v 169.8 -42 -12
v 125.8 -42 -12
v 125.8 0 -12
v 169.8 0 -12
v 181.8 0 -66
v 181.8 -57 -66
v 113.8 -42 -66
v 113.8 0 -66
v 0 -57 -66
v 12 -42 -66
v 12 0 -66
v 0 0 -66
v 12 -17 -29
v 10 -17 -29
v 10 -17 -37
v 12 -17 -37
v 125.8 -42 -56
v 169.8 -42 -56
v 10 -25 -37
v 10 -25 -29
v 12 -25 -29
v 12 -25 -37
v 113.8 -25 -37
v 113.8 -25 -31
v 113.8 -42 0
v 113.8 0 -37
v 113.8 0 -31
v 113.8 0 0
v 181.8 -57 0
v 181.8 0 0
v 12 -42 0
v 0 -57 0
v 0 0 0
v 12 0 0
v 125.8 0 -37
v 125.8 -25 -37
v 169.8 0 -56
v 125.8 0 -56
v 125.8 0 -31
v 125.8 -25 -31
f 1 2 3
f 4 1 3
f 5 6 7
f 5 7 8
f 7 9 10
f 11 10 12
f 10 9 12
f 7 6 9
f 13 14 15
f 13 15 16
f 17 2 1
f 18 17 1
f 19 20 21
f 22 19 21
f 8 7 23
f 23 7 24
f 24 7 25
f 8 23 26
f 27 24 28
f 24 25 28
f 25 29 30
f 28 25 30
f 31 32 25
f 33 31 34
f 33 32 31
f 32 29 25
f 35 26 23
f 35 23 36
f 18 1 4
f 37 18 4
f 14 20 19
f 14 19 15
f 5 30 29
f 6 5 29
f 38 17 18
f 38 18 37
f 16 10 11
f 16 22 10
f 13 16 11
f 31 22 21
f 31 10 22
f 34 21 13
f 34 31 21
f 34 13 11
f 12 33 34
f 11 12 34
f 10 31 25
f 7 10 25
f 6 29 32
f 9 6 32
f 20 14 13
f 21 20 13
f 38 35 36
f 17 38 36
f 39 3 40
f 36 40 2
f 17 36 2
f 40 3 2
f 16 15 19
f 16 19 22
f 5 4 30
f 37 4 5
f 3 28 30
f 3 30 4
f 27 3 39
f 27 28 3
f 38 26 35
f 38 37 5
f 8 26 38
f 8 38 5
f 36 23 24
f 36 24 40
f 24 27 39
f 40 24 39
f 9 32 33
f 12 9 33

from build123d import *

# Parameters (mm, degrees)
BOSS_EXTRUDE1_DEPTH = 66
SKETCH3_W           = 2
SKETCH3_H           = 8
CUT_EXTRUDE1_DEPTH  = 37
SKETCH3_3_W         = 2
SKETCH3_3_H         = 8
BOSS_EXTRUDE2_DEPTH = 29
BOSS_EXTRUDE3_REACH = 155.071
SKETCH4_W           = 12
SKETCH4_H           = 42
SKETCH4_W_2         = 10
SKETCH5_W           = 12
SKETCH5_H           = 6
CUT_EXTRUDE2_DEPTH  = 25


with BuildPart() as part:
    # Sketch2 → Boss-Extrude1 (new body)
    with BuildSketch(Plane.XY):
        Polygon((0, 0), (12, 0), (12, -42), (113.8, -42), (113.8, 0), (125.8, 0), (125.8, -42), (169.8, -42), (169.8, 0), (181.8, 0), (181.8, -57), (0, -57), align=None)
    extrude(amount=-BOSS_EXTRUDE1_DEPTH)

    # Sketch3 → Cut-Extrude1 (cut)
    with BuildSketch(Plane.XY):
        with Locations((11, -21)):
            Rectangle(SKETCH3_W, SKETCH3_H)
    extrude(amount=-CUT_EXTRUDE1_DEPTH, mode=Mode.SUBTRACT)

    # Sketch3<3> → Boss-Extrude2 (add)
    with BuildSketch(Plane.XY):
        with Locations((11, -21)):
            Rectangle(SKETCH3_3_W, SKETCH3_3_H)
    extrude(amount=-BOSS_EXTRUDE2_DEPTH)

    # Sketch4 → Boss-Extrude3 (add, up to next)
    with BuildSketch(Plane(origin=(125.8, 0, 0), x_dir=(0, 0, -1), z_dir=(1, 0, 0)), mode=Mode.PRIVATE) as boss_extrude3_sk1:
        with Locations((6, -21)):
            Rectangle(SKETCH4_W, SKETCH4_H)
    boss_extrude3_tool1 = extrude(boss_extrude3_sk1.sketch, amount=BOSS_EXTRUDE3_REACH, mode=Mode.PRIVATE) - part.part
    # Sketch4 → Boss-Extrude3 (add, up to next)
    with BuildSketch(Plane(origin=(125.8, 0, 0), x_dir=(0, 0, -1), z_dir=(1, 0, 0)), mode=Mode.PRIVATE) as boss_extrude3_sk2:
        with Locations((61, -21)):
            Rectangle(SKETCH4_W_2, SKETCH4_H)
    boss_extrude3_tool2 = extrude(boss_extrude3_sk2.sketch, amount=BOSS_EXTRUDE3_REACH, mode=Mode.PRIVATE) - part.part
    add(boss_extrude3_tool1.solids().sort_by_distance((125.8, -21, -6))[0])
    add(boss_extrude3_tool2.solids().sort_by_distance((125.8, -21, -61))[0])

    # Sketch5 → Cut-Extrude2 (cut)
    with BuildSketch(Plane(origin=(0, 0, 0), x_dir=(1, 0, 0), z_dir=(0, 1, 0))):
        with Locations((119.8, 34)):
            Rectangle(SKETCH5_W, SKETCH5_H)
    extrude(amount=-CUT_EXTRUDE2_DEPTH, mode=Mode.SUBTRACT)


solid = part.part
